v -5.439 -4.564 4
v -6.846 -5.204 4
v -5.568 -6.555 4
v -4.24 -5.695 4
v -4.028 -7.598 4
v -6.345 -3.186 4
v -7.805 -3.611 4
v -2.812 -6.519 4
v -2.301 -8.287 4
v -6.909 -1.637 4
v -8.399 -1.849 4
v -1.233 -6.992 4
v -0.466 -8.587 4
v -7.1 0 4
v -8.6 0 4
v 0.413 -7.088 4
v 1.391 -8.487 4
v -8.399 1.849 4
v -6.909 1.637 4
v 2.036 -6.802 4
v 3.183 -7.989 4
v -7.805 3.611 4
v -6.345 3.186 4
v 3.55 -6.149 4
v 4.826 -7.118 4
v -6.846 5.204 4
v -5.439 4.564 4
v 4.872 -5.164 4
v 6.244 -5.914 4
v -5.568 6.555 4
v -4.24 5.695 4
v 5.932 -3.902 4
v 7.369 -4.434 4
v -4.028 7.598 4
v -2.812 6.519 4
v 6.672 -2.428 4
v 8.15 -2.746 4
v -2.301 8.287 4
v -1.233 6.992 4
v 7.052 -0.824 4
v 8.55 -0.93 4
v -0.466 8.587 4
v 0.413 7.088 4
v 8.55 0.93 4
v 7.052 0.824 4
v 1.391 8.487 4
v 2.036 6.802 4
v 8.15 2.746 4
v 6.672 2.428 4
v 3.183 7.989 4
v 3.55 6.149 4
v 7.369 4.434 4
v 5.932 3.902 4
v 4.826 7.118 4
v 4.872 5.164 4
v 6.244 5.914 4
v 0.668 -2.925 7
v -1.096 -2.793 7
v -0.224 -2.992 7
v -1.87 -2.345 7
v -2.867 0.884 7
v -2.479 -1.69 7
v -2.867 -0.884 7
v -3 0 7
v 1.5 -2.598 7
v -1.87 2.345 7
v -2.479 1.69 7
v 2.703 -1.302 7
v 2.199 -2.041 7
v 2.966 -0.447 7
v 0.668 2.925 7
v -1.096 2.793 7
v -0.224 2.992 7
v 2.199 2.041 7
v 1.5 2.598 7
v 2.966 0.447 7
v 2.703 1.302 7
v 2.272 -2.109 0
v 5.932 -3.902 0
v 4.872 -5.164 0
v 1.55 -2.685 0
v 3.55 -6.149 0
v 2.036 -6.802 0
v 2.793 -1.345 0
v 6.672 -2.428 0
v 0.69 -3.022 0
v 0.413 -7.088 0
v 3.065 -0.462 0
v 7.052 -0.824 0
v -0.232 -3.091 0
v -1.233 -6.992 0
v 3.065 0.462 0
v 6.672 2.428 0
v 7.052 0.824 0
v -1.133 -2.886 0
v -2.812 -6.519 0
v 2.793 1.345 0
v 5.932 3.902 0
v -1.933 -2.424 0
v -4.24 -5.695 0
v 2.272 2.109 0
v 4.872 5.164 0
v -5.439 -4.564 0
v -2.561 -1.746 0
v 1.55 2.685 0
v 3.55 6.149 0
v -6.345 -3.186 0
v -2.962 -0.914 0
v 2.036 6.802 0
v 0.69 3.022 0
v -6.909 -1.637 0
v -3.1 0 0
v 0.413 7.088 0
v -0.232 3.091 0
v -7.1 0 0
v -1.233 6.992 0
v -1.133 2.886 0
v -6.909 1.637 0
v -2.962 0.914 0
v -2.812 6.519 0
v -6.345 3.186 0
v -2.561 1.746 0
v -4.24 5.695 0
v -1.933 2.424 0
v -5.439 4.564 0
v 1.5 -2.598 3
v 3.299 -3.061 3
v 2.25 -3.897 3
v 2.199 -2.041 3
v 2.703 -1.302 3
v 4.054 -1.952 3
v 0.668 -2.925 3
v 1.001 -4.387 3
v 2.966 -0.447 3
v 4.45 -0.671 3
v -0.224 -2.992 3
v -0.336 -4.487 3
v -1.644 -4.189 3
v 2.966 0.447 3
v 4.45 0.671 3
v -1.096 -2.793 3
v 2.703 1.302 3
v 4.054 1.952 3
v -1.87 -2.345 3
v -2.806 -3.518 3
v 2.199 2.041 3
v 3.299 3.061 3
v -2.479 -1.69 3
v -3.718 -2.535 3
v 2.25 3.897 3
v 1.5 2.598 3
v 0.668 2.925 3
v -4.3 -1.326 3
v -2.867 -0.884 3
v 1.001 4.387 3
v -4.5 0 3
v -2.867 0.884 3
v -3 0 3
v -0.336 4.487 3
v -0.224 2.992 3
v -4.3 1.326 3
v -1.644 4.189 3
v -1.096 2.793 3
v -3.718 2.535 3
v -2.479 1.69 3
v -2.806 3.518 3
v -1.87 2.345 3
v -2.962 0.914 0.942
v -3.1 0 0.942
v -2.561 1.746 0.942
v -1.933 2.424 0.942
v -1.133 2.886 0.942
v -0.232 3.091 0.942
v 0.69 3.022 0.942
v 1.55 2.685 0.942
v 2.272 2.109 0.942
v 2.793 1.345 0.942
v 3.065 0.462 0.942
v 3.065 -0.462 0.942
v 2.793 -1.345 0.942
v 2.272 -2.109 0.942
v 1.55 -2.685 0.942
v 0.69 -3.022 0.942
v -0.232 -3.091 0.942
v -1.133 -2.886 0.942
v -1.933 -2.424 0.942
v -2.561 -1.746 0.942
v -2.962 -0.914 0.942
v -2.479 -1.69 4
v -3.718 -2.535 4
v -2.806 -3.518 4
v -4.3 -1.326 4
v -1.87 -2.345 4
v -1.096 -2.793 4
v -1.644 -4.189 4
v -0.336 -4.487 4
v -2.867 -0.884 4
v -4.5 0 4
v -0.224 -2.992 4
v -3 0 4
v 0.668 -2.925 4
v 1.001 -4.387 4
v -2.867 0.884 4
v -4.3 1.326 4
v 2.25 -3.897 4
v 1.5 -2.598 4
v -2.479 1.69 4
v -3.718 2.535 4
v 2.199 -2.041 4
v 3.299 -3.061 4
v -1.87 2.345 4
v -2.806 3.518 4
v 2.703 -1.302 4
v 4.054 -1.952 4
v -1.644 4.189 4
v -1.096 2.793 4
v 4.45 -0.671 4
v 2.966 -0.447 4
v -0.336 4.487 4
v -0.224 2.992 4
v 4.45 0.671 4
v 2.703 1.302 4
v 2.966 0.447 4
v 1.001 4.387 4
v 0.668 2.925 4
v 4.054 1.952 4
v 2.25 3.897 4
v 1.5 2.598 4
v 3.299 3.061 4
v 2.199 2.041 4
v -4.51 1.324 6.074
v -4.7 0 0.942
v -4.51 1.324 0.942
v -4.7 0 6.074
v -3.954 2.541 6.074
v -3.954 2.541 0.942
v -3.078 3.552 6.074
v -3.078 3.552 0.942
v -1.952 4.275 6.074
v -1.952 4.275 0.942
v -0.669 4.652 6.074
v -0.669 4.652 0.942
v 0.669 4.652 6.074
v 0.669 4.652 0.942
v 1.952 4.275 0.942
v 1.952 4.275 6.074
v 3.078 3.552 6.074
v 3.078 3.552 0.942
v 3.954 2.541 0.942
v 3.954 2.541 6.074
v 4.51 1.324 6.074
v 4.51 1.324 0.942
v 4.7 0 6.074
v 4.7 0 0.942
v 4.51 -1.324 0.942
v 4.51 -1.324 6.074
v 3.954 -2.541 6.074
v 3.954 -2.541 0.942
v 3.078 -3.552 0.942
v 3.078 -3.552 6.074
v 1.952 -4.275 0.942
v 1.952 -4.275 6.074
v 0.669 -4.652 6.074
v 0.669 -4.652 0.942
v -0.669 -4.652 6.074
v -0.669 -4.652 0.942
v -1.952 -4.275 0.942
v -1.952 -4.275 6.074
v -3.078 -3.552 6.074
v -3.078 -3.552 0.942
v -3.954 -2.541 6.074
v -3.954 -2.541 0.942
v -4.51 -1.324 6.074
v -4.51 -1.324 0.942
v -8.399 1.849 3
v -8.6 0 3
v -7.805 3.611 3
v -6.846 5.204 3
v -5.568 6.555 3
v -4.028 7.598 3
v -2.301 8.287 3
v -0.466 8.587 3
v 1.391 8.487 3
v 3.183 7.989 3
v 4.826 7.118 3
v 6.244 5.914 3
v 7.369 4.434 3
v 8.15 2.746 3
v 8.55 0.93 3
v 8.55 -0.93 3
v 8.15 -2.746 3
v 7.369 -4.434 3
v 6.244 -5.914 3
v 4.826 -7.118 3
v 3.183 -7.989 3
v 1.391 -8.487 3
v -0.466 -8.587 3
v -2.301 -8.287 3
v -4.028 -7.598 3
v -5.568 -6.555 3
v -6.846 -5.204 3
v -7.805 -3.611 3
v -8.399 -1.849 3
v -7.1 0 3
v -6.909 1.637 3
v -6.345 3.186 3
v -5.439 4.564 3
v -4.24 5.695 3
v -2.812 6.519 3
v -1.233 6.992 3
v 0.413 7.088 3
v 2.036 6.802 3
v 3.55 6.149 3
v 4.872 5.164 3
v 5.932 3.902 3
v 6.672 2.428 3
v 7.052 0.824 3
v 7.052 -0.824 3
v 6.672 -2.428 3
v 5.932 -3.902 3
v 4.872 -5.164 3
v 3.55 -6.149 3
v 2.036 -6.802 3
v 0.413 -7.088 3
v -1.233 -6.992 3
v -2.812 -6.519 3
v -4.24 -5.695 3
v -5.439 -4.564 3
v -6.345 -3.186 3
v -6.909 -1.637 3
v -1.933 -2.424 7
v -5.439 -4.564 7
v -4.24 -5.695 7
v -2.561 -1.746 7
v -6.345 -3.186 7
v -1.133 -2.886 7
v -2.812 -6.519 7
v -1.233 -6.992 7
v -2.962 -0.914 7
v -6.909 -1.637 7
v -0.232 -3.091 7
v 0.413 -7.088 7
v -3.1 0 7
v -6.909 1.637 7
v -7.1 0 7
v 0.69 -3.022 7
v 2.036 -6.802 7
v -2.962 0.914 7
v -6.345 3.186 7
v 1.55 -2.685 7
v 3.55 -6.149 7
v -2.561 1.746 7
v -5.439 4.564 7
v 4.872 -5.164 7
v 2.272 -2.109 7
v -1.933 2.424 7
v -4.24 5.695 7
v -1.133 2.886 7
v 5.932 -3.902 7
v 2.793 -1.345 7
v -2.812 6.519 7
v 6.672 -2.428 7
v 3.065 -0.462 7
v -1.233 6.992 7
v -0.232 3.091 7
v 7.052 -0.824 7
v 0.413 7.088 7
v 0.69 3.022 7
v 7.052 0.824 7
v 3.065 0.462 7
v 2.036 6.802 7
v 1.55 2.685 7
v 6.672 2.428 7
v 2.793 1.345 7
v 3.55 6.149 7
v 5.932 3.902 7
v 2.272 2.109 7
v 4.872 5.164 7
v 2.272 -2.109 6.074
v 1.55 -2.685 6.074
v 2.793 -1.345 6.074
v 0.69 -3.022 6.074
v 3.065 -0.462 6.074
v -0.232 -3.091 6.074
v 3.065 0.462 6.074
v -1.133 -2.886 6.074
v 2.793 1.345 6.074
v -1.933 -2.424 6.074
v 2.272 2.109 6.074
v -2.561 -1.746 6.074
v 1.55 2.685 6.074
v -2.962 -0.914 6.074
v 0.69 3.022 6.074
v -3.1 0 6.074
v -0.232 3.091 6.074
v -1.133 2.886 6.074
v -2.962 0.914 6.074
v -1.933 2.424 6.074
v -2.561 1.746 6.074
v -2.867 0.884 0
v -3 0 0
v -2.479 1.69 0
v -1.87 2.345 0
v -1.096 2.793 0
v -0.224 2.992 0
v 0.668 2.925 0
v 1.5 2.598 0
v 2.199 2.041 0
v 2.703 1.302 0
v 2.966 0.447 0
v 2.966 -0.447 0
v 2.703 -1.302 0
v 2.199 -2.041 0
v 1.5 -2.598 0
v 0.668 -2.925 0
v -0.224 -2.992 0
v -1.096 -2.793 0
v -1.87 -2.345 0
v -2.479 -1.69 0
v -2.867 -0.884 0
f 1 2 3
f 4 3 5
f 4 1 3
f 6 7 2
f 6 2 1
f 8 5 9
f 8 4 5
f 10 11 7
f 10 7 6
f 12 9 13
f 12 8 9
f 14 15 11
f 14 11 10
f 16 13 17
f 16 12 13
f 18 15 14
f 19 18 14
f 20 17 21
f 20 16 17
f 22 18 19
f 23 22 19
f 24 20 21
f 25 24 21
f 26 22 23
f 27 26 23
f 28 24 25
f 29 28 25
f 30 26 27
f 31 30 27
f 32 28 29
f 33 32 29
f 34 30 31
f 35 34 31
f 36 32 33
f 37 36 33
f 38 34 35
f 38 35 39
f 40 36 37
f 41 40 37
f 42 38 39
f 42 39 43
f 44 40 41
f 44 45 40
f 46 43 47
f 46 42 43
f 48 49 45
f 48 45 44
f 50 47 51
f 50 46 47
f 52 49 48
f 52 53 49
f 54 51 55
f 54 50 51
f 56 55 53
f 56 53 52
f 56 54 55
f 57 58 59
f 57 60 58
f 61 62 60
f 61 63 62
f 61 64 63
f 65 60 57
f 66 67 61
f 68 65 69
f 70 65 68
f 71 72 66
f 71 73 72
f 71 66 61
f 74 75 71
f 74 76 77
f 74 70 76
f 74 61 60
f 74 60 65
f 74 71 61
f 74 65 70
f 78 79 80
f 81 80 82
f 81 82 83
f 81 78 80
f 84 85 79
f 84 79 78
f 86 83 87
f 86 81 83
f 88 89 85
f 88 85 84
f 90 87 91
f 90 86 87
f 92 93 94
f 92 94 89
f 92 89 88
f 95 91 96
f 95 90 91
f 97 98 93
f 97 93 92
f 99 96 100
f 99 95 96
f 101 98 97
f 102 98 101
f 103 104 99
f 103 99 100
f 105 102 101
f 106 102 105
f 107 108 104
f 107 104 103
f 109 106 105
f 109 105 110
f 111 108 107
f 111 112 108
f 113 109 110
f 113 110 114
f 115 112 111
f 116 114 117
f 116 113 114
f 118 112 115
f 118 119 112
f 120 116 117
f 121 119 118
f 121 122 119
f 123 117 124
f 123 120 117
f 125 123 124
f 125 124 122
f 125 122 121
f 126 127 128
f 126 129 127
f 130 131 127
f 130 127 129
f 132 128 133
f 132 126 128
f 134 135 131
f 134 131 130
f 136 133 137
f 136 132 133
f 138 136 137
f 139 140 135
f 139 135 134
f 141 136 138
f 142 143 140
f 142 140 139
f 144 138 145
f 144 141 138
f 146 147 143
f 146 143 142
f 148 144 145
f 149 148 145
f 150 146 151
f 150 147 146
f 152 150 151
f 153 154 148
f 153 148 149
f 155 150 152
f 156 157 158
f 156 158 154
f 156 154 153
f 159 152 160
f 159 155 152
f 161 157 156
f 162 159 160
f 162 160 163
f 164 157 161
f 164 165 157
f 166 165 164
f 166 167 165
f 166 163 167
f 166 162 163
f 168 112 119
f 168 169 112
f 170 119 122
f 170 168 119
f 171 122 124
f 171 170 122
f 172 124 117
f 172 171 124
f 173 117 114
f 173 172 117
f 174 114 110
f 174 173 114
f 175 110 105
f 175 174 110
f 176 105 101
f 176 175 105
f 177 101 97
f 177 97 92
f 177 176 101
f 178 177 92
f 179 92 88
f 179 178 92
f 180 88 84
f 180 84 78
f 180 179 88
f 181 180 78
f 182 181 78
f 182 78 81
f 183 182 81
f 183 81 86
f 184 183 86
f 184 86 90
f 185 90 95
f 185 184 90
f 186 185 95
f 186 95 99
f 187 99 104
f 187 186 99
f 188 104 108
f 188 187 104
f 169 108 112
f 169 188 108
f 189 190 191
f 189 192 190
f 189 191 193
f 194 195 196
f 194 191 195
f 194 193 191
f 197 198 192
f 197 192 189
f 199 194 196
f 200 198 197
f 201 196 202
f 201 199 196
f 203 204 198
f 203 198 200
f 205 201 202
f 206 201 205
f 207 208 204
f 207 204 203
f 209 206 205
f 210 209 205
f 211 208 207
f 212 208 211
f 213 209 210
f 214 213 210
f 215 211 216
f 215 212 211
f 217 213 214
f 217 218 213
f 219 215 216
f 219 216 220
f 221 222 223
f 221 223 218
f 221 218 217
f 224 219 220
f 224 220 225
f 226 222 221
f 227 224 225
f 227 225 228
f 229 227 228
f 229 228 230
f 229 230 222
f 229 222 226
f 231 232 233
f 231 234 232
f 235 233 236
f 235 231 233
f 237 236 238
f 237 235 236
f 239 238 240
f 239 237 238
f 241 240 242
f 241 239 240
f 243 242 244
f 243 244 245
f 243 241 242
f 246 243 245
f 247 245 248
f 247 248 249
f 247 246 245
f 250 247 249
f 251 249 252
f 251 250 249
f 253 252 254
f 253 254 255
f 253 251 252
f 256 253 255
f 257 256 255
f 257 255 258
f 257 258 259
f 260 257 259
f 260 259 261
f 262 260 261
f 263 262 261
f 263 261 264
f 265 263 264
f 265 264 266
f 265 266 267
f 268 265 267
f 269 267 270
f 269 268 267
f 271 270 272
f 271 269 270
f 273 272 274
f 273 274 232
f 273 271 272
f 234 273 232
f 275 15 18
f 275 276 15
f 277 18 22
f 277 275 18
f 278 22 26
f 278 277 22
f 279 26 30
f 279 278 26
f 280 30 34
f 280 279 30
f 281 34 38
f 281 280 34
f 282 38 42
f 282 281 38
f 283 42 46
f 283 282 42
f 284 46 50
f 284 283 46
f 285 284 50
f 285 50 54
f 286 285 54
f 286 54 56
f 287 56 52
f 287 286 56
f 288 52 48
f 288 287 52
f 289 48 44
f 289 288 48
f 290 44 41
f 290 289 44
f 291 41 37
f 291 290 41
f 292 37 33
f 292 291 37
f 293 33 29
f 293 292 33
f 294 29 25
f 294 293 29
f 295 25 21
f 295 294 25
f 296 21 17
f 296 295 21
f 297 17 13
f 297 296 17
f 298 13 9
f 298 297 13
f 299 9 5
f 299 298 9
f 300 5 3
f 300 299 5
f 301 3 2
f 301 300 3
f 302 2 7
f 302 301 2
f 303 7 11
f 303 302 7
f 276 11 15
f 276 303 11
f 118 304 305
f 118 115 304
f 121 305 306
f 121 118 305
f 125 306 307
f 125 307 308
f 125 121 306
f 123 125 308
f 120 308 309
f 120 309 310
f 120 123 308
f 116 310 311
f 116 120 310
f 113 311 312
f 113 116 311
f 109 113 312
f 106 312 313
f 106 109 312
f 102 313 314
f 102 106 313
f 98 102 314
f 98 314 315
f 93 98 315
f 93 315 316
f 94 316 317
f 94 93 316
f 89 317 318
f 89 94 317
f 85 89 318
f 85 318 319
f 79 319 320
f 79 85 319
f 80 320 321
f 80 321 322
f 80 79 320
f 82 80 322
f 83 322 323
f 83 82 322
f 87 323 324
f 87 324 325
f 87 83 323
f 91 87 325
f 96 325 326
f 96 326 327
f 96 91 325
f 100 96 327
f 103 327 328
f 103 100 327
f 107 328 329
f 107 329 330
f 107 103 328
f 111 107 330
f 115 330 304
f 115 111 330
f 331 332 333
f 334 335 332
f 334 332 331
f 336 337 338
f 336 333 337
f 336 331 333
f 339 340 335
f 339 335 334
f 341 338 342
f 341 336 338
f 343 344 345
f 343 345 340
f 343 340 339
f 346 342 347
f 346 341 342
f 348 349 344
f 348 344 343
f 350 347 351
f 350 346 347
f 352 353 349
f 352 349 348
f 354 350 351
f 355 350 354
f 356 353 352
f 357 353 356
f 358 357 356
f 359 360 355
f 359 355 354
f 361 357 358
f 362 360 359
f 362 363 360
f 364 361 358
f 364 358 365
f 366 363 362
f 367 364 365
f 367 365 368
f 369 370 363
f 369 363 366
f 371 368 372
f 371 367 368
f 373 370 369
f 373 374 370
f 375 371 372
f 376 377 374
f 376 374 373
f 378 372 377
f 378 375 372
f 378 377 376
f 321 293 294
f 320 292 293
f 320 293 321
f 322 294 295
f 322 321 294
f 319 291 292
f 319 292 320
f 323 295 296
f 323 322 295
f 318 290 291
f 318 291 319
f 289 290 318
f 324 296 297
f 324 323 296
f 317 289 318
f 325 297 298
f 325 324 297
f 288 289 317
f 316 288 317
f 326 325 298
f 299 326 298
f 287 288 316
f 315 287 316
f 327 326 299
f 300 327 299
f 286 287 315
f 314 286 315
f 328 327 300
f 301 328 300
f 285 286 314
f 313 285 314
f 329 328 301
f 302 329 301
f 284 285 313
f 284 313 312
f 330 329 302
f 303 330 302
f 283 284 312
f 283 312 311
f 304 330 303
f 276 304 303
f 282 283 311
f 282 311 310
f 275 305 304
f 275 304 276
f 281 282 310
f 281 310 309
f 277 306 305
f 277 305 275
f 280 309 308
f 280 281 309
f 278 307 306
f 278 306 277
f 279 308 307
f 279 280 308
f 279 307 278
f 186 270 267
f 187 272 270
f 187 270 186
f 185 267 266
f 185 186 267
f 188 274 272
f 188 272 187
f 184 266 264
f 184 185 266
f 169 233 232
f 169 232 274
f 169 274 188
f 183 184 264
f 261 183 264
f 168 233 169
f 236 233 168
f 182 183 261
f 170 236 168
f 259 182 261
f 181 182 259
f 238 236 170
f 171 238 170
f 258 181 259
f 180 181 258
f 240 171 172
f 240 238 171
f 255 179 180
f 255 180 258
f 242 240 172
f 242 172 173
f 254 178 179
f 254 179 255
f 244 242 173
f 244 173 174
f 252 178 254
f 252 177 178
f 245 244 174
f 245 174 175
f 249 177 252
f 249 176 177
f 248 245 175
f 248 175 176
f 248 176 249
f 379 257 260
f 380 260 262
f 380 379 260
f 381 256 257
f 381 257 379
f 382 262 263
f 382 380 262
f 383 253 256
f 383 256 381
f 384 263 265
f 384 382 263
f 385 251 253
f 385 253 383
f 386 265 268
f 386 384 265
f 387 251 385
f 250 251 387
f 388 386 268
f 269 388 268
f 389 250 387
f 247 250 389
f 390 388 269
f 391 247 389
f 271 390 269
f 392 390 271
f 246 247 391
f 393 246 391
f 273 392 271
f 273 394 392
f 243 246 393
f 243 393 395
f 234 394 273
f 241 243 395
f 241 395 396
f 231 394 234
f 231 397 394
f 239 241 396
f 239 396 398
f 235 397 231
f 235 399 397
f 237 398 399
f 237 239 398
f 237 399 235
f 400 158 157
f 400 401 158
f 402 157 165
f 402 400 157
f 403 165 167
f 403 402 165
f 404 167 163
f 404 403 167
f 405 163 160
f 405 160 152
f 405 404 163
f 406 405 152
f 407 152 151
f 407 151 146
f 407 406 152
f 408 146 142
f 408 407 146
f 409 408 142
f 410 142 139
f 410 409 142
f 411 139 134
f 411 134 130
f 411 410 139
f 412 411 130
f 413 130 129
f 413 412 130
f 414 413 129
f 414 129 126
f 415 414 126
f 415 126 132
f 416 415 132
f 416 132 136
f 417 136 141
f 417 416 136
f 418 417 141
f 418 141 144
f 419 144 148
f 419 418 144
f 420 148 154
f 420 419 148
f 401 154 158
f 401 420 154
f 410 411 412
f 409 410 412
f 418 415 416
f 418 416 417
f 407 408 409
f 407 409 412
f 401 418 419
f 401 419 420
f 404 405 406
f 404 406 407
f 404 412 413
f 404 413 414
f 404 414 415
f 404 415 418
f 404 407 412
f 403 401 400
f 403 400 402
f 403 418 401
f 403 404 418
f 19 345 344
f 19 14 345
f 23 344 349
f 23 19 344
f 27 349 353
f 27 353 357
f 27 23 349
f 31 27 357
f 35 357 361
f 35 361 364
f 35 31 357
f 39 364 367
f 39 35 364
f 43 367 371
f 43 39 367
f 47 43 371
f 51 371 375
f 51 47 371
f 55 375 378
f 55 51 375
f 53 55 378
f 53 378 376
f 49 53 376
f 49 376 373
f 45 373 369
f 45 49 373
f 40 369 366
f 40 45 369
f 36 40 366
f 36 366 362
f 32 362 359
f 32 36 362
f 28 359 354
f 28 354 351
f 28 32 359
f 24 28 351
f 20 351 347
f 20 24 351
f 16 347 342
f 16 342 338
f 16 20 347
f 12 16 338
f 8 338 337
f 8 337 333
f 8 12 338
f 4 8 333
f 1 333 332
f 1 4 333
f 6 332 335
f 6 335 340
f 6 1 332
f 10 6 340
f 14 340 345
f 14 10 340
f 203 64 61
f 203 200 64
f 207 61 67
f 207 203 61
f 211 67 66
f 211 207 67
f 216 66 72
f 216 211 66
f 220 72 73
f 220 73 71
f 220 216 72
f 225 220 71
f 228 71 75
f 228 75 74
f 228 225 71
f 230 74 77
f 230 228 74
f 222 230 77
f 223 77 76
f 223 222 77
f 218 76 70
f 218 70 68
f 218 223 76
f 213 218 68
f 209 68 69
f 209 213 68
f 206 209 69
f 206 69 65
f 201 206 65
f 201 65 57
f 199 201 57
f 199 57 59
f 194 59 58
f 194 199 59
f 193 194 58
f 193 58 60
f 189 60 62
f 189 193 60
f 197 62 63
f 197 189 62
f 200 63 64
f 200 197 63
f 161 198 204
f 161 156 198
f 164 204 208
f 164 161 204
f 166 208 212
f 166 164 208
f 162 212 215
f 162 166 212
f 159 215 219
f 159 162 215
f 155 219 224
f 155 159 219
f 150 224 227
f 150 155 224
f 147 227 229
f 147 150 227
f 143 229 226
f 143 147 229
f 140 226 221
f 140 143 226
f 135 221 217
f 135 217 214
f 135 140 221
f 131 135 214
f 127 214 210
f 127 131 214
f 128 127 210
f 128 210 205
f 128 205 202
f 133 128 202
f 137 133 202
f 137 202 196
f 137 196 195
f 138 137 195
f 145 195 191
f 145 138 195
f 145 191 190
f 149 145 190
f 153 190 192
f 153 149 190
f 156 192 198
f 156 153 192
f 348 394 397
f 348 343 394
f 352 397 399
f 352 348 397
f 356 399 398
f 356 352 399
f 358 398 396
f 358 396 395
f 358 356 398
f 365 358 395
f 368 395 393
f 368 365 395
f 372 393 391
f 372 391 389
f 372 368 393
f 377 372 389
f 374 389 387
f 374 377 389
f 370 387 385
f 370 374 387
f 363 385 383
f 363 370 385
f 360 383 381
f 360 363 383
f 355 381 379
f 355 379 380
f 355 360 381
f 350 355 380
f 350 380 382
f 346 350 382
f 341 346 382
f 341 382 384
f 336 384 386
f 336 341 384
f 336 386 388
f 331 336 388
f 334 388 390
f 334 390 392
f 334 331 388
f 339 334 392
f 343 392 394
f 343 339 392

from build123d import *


with BuildPart() as f1:
    # F0 (on Front) → F1 (revolve)
    with BuildSketch(Plane.XZ):
        Polygon((-7.1, 0), (-3.1, 0), (-3.1, 0.941653), (-4.7, 0.941653), (-4.7, 6.07437), (-3.1, 6.07437), (-3.1, 7), (-7.1, 7), (-7.1, 4), (-8.6, 4), (-8.6, 3), (-7.1, 3), align=None)
        Polygon((-3, 0), (0, 0), (0, 7), (-3, 7), (-3, 4), (-4.5, 4), (-4.5, 3), (-3, 3), align=None)
    revolve(axis=Axis((0, 0, 3.5), (0, 0, -1)))


solid = f1.part
